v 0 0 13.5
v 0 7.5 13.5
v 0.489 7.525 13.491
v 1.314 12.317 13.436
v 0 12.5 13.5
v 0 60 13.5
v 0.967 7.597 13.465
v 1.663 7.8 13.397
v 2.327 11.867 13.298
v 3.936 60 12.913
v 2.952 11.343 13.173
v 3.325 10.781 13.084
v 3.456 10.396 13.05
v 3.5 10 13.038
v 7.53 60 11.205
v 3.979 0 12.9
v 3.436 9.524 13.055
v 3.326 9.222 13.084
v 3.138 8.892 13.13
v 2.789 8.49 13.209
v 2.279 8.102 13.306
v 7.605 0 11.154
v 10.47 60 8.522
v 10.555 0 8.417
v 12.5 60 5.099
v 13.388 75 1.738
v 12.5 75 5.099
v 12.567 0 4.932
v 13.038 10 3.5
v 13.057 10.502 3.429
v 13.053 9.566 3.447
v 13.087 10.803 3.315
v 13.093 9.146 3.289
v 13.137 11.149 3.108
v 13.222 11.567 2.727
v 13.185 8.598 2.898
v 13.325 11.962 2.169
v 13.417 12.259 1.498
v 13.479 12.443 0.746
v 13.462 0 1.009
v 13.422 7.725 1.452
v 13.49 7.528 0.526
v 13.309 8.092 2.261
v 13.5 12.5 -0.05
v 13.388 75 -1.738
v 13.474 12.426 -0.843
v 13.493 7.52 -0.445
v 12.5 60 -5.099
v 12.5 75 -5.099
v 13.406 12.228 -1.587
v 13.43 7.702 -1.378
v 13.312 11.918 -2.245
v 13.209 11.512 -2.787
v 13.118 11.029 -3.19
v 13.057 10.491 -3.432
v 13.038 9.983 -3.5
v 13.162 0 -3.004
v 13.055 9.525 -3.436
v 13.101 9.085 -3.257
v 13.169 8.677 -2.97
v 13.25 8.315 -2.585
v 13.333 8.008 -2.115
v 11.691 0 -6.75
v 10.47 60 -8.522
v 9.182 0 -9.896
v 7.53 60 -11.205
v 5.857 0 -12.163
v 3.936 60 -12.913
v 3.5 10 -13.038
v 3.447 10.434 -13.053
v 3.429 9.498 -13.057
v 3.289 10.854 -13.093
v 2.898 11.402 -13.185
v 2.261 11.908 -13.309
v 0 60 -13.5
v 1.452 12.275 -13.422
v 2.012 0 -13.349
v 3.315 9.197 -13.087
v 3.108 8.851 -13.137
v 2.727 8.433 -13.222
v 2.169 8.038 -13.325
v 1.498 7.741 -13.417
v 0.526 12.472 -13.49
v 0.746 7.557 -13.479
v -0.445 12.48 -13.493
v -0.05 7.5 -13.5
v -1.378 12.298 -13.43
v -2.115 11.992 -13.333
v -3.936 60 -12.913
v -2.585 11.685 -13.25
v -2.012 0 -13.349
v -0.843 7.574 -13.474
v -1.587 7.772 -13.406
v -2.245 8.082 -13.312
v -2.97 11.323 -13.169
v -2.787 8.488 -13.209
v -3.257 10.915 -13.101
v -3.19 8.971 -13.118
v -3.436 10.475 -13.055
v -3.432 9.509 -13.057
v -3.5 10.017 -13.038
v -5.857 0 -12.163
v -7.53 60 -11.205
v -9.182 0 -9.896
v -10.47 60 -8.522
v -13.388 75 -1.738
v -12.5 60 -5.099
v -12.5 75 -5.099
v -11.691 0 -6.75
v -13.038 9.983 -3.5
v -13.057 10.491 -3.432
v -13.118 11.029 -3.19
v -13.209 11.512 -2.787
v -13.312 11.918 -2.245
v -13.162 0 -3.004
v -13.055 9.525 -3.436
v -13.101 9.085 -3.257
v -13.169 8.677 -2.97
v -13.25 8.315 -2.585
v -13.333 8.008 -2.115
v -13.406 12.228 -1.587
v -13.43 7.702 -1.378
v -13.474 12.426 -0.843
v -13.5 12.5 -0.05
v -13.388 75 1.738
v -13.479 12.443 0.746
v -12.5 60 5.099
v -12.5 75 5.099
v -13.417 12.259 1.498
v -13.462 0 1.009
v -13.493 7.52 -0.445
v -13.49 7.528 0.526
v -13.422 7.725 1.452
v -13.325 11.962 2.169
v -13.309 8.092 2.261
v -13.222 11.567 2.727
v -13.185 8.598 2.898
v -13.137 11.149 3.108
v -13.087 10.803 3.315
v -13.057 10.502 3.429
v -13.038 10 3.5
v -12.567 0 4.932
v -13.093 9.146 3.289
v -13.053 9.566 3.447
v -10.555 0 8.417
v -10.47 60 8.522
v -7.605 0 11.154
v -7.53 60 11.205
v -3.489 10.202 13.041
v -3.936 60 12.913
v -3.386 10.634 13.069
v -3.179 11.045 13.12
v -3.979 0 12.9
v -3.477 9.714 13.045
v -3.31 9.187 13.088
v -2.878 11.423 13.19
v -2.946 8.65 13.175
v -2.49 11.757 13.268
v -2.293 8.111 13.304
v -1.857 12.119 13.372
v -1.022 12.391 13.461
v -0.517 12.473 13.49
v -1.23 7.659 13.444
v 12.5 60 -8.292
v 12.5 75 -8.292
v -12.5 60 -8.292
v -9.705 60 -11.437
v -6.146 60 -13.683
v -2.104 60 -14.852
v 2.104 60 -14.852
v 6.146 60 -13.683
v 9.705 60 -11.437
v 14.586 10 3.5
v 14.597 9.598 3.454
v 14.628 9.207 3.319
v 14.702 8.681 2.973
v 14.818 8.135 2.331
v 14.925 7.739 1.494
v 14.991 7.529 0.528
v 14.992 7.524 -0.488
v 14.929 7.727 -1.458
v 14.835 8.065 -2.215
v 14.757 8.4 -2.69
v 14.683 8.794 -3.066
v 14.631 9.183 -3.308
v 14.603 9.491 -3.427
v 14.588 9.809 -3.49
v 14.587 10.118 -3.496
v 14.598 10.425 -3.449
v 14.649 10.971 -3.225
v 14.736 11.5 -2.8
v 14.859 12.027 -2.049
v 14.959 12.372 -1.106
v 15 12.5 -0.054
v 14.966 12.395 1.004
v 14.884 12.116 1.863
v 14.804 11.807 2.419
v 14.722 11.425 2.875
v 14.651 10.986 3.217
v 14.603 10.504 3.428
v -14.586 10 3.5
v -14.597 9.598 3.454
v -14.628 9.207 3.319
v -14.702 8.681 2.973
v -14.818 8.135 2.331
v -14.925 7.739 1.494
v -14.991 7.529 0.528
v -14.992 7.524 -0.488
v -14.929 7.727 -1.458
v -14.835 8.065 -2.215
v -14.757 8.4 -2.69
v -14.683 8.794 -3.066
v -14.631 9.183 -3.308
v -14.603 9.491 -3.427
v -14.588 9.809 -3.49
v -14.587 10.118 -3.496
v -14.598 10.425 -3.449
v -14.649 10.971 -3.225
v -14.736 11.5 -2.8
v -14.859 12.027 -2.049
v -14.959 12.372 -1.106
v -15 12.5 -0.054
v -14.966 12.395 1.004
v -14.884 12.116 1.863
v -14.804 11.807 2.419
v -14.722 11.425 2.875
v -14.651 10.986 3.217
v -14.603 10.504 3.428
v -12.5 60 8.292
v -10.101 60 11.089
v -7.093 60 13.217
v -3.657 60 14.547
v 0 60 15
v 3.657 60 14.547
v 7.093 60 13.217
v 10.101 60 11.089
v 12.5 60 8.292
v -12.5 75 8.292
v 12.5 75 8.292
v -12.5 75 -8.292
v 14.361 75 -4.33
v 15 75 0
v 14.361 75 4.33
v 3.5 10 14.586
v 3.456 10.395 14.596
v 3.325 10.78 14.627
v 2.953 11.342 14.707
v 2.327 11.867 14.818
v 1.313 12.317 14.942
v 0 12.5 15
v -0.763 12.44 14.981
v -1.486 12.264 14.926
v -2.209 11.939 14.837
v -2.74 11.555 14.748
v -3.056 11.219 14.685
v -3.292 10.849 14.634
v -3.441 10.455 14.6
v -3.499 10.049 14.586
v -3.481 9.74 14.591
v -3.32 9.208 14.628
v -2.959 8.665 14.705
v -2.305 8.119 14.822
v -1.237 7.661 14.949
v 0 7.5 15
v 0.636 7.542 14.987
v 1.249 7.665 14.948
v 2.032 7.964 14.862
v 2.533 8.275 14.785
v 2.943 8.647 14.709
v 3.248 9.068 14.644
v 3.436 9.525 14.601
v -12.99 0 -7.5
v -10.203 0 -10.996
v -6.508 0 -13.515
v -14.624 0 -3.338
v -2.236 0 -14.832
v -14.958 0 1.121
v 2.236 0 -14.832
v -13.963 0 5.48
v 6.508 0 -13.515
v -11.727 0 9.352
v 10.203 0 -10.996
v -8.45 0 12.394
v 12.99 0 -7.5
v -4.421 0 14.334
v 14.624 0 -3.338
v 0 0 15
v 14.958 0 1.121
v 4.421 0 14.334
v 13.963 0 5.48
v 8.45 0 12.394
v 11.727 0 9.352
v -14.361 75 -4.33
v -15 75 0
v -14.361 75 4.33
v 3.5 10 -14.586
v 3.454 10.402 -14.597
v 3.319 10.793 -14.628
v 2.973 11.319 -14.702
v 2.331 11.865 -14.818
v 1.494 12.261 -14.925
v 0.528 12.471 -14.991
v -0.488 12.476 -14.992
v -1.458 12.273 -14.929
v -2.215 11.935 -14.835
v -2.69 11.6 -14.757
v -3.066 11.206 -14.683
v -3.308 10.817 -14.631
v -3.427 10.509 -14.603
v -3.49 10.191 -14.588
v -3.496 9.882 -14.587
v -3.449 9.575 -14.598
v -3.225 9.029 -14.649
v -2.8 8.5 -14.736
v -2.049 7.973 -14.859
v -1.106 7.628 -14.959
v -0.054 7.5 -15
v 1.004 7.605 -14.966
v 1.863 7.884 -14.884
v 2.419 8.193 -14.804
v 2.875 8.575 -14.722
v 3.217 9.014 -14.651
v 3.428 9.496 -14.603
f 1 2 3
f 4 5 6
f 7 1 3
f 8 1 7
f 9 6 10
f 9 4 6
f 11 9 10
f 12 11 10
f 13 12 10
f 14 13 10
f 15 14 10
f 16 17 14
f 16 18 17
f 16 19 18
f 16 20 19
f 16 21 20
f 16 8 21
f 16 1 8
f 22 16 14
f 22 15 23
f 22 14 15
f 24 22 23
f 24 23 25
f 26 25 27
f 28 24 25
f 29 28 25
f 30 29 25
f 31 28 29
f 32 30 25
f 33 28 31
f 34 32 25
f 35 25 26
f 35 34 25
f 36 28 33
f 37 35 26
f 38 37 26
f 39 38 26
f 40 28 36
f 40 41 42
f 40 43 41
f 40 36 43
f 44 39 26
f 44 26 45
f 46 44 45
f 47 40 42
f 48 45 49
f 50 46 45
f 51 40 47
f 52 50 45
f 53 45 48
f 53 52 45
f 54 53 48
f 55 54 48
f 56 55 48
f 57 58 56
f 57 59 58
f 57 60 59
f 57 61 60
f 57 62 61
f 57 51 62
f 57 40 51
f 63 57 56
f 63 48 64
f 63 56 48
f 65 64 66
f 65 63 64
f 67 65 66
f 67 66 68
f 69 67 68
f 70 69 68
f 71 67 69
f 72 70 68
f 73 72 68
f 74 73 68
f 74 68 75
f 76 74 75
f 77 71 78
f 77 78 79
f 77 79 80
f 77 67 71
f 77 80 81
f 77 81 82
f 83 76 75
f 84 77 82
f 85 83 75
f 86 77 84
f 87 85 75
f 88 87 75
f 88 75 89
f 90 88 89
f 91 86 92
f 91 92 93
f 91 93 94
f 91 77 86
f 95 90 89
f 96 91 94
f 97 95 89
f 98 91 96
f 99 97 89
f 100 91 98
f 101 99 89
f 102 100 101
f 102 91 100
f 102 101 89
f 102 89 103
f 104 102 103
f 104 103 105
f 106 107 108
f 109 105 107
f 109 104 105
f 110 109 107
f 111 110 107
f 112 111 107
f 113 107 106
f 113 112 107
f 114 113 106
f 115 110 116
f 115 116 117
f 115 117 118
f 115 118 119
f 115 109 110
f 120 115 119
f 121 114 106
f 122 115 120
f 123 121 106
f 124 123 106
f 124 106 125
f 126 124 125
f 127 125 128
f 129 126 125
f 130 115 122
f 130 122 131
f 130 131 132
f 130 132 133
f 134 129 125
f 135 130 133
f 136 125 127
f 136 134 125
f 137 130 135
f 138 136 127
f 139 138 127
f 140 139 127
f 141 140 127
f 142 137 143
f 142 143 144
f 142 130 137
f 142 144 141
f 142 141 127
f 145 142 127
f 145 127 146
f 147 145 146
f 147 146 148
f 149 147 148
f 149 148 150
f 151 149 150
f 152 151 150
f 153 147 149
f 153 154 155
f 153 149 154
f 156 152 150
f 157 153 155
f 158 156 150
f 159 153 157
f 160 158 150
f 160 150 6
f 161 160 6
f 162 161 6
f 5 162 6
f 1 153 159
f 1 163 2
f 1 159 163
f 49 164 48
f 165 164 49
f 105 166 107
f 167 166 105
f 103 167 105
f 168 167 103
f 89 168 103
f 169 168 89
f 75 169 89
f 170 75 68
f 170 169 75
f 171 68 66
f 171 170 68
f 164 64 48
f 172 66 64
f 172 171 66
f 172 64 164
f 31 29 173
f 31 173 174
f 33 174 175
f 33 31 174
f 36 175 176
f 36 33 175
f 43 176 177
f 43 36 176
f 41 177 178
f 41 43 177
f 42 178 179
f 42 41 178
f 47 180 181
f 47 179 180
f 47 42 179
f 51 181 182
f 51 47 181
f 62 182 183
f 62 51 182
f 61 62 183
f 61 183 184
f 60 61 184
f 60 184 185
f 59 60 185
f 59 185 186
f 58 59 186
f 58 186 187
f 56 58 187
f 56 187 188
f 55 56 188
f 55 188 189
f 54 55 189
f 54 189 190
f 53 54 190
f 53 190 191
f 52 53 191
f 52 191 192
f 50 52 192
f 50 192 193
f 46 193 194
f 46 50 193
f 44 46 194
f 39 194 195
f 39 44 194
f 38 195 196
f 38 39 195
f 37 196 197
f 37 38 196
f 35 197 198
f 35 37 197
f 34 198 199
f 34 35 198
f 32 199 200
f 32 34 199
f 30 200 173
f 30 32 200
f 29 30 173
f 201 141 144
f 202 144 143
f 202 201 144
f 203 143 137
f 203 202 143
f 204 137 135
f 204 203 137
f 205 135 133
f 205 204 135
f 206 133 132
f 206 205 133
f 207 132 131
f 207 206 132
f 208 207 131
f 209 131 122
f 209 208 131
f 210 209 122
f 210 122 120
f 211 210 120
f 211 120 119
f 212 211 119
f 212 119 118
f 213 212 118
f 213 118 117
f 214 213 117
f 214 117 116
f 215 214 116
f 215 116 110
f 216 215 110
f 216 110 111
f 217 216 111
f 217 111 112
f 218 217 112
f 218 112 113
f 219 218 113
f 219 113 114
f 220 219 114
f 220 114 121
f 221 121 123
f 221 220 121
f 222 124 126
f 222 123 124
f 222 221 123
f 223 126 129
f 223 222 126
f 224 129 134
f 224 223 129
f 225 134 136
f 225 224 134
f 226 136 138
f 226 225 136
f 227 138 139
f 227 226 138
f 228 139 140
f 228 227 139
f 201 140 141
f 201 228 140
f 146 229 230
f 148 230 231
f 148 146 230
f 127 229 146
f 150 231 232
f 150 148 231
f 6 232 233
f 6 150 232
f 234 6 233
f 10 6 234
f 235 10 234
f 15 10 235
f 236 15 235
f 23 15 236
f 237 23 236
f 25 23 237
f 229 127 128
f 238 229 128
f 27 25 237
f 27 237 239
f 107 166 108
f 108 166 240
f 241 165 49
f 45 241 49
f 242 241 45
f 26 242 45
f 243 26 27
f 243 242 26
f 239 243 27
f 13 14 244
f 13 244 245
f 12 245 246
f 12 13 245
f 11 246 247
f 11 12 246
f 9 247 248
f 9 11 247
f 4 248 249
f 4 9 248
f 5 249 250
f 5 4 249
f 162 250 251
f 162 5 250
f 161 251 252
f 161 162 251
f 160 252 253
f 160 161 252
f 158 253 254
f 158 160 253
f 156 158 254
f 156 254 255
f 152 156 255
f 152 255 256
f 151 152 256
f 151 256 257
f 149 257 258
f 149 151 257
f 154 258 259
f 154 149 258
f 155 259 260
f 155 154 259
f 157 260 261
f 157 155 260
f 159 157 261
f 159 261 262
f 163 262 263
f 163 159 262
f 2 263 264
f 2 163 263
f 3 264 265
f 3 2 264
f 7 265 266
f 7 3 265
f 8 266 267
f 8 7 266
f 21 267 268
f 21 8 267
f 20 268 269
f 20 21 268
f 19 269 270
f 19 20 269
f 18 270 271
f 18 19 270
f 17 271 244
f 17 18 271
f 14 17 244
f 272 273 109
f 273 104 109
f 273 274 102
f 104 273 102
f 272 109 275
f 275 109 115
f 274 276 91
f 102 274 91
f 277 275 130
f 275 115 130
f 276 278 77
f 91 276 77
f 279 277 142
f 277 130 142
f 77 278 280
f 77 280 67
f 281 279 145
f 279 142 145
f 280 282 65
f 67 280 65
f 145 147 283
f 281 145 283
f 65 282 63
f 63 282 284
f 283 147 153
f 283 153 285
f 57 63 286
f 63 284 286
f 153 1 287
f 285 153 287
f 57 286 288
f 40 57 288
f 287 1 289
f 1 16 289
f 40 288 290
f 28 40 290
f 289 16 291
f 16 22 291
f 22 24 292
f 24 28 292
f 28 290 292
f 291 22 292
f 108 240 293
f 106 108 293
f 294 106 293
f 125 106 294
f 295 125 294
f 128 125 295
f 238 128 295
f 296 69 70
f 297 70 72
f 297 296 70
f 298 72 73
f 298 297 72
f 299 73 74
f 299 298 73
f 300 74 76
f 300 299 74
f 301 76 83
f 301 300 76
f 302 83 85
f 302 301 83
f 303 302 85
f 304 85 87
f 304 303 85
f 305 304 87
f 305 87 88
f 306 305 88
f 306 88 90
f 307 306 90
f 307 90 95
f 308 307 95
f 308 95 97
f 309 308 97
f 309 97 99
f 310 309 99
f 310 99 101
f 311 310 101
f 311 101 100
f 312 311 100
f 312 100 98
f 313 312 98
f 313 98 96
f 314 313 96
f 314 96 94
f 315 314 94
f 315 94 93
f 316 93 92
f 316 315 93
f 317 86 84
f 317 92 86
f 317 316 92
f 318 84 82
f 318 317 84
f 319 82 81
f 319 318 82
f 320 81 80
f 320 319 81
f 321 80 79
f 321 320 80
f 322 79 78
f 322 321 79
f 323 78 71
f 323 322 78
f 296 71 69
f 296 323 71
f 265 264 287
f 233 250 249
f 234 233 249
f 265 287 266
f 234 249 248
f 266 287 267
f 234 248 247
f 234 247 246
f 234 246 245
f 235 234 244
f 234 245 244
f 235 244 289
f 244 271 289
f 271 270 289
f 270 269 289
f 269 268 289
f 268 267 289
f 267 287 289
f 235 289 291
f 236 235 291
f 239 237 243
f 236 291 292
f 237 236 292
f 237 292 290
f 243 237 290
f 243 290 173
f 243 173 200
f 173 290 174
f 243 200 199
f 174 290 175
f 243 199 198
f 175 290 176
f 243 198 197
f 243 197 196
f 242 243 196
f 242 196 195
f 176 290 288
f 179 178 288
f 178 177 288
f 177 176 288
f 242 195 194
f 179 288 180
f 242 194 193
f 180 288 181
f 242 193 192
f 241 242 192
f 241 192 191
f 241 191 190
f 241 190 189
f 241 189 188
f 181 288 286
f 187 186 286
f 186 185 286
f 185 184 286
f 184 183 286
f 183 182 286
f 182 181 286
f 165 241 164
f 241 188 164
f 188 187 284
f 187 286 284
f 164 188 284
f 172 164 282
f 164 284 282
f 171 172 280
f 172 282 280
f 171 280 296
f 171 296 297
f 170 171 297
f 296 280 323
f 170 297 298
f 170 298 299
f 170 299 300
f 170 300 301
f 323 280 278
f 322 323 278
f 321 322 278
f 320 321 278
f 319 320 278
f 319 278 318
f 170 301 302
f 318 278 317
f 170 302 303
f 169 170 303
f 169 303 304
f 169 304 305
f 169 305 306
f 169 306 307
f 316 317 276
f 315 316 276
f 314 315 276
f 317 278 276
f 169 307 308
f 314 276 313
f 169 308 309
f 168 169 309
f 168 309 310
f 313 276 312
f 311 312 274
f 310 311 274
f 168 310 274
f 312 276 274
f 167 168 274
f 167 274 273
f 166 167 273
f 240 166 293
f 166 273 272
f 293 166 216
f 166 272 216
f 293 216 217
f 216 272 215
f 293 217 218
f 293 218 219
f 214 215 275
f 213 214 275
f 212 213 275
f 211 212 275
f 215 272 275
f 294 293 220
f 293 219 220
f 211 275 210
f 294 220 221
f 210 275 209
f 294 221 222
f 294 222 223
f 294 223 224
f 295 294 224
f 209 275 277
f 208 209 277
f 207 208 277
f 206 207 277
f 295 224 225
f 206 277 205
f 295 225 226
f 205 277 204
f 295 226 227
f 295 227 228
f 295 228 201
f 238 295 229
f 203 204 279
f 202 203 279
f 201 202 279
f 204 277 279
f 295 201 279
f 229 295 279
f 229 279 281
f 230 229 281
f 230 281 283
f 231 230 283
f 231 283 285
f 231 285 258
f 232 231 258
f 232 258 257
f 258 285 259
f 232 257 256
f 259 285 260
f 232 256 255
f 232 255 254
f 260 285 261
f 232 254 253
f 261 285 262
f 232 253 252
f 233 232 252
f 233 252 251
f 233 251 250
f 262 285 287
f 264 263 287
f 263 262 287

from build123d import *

# Parameters (mm, degrees)
SKETCH2_R               = 15
SKETCH2_R_2             = 13.5
BOSS_EXTRUDE2_DEPTH     = 75
CUT_EXTRUDE1_DEPTH      = 78.942286341
CUT_EXTRUDE1_DEPTH_BACK = 78.942286341
SKETCH4_RX              = 3.5
SKETCH4_RY              = 2.5
CUT_EXTRUDE2_DEPTH      = 78.942286475
CUT_EXTRUDE2_DEPTH_BACK = 78.942286475
SKETCH5_RX              = 3.5
SKETCH5_RY              = 2.5
CUT_EXTRUDE3_DEPTH      = 78.942286475
CUT_EXTRUDE3_DEPTH_BACK = 78.942286475
SKETCH6_W               = 25
SKETCH6_H               = 15


with BuildPart() as part:
    # Sketch2 → Boss-Extrude2 (new body)
    with BuildSketch(Plane(origin=(0, 0, 0), x_dir=(1, 0, 0), z_dir=(0, 1, 0))):
        with Locations(Location((0, 0, 0), (0, 0, 270))):
            Circle(SKETCH2_R)
        with Locations(Location((0, 0, 0), (0, 0, 270))):
            Circle(SKETCH2_R_2, mode=Mode.SUBTRACT)
    extrude(amount=BOSS_EXTRUDE2_DEPTH)

    # Sketch4 → Cut-Extrude1 (cut, two sides: drawn at the far end of the back side and taken through both)
    with BuildSketch(Plane.XY.offset(-CUT_EXTRUDE1_DEPTH_BACK)):
        with Locations((0, 10)):
            Ellipse(SKETCH4_RX, SKETCH4_RY)
    extrude(amount=CUT_EXTRUDE1_DEPTH + CUT_EXTRUDE1_DEPTH_BACK, mode=Mode.SUBTRACT)

    # Sketch5 → Cut-Extrude2 (cut, two sides: drawn at the far end of the back side and taken through both)
    with BuildSketch(Plane(origin=(0, 0, 0), x_dir=(0, 0, -1), z_dir=(1, 0, 0)).offset(-CUT_EXTRUDE2_DEPTH_BACK)):
        with Locations(Location((0, 10), (0, 0, 180))):
            Ellipse(SKETCH5_RX, SKETCH5_RY)
    extrude(amount=CUT_EXTRUDE2_DEPTH + CUT_EXTRUDE2_DEPTH_BACK, mode=Mode.SUBTRACT)

    # Sketch6 → Cut-Extrude3 (cut, two sides: drawn at the far end of the back side and taken through both)
    with BuildSketch(Plane.XY.offset(-CUT_EXTRUDE3_DEPTH_BACK)):
        with Locations((0, 67.5)):
            Rectangle(SKETCH6_W, SKETCH6_H)
    extrude(amount=CUT_EXTRUDE3_DEPTH + CUT_EXTRUDE3_DEPTH_BACK, mode=Mode.SUBTRACT)


solid = part.part
